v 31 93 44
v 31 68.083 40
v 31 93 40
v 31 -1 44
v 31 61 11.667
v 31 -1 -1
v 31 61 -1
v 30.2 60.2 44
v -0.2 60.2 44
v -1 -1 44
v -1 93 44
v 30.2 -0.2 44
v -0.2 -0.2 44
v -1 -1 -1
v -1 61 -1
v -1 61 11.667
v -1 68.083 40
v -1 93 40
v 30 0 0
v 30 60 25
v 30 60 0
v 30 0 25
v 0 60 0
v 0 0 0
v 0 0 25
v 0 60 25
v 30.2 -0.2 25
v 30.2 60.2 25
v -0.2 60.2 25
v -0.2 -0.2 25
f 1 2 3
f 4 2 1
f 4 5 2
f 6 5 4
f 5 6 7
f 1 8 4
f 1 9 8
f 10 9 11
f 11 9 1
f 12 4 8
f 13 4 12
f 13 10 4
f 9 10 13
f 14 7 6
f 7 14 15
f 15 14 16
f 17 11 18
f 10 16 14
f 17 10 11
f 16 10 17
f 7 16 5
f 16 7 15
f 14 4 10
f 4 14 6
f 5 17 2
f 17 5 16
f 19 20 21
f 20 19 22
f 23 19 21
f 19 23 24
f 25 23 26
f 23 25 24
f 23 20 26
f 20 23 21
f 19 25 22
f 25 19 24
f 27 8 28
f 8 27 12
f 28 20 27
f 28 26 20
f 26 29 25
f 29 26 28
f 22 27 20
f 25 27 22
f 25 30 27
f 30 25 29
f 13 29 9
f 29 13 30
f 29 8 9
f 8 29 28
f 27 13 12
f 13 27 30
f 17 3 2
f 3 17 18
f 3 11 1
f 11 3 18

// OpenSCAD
//47.3176
//78.8627455
//
//45 80

//cube([30,60,25]);
difference() {
    union() {
        translate([-1,-1,-1]) cube([32,62,45]);
        translate([-1,61,33]) rotate([0,90]) resize([32,16,32]) cylinder(d=16,$fn=3,h=32);
    }
    cube([30,60,430]);
    translate([-.2,-.2,25]) cube([30.4,60.4,460]);
}
translate([-1,61,40]) cube([32,32,4]);
